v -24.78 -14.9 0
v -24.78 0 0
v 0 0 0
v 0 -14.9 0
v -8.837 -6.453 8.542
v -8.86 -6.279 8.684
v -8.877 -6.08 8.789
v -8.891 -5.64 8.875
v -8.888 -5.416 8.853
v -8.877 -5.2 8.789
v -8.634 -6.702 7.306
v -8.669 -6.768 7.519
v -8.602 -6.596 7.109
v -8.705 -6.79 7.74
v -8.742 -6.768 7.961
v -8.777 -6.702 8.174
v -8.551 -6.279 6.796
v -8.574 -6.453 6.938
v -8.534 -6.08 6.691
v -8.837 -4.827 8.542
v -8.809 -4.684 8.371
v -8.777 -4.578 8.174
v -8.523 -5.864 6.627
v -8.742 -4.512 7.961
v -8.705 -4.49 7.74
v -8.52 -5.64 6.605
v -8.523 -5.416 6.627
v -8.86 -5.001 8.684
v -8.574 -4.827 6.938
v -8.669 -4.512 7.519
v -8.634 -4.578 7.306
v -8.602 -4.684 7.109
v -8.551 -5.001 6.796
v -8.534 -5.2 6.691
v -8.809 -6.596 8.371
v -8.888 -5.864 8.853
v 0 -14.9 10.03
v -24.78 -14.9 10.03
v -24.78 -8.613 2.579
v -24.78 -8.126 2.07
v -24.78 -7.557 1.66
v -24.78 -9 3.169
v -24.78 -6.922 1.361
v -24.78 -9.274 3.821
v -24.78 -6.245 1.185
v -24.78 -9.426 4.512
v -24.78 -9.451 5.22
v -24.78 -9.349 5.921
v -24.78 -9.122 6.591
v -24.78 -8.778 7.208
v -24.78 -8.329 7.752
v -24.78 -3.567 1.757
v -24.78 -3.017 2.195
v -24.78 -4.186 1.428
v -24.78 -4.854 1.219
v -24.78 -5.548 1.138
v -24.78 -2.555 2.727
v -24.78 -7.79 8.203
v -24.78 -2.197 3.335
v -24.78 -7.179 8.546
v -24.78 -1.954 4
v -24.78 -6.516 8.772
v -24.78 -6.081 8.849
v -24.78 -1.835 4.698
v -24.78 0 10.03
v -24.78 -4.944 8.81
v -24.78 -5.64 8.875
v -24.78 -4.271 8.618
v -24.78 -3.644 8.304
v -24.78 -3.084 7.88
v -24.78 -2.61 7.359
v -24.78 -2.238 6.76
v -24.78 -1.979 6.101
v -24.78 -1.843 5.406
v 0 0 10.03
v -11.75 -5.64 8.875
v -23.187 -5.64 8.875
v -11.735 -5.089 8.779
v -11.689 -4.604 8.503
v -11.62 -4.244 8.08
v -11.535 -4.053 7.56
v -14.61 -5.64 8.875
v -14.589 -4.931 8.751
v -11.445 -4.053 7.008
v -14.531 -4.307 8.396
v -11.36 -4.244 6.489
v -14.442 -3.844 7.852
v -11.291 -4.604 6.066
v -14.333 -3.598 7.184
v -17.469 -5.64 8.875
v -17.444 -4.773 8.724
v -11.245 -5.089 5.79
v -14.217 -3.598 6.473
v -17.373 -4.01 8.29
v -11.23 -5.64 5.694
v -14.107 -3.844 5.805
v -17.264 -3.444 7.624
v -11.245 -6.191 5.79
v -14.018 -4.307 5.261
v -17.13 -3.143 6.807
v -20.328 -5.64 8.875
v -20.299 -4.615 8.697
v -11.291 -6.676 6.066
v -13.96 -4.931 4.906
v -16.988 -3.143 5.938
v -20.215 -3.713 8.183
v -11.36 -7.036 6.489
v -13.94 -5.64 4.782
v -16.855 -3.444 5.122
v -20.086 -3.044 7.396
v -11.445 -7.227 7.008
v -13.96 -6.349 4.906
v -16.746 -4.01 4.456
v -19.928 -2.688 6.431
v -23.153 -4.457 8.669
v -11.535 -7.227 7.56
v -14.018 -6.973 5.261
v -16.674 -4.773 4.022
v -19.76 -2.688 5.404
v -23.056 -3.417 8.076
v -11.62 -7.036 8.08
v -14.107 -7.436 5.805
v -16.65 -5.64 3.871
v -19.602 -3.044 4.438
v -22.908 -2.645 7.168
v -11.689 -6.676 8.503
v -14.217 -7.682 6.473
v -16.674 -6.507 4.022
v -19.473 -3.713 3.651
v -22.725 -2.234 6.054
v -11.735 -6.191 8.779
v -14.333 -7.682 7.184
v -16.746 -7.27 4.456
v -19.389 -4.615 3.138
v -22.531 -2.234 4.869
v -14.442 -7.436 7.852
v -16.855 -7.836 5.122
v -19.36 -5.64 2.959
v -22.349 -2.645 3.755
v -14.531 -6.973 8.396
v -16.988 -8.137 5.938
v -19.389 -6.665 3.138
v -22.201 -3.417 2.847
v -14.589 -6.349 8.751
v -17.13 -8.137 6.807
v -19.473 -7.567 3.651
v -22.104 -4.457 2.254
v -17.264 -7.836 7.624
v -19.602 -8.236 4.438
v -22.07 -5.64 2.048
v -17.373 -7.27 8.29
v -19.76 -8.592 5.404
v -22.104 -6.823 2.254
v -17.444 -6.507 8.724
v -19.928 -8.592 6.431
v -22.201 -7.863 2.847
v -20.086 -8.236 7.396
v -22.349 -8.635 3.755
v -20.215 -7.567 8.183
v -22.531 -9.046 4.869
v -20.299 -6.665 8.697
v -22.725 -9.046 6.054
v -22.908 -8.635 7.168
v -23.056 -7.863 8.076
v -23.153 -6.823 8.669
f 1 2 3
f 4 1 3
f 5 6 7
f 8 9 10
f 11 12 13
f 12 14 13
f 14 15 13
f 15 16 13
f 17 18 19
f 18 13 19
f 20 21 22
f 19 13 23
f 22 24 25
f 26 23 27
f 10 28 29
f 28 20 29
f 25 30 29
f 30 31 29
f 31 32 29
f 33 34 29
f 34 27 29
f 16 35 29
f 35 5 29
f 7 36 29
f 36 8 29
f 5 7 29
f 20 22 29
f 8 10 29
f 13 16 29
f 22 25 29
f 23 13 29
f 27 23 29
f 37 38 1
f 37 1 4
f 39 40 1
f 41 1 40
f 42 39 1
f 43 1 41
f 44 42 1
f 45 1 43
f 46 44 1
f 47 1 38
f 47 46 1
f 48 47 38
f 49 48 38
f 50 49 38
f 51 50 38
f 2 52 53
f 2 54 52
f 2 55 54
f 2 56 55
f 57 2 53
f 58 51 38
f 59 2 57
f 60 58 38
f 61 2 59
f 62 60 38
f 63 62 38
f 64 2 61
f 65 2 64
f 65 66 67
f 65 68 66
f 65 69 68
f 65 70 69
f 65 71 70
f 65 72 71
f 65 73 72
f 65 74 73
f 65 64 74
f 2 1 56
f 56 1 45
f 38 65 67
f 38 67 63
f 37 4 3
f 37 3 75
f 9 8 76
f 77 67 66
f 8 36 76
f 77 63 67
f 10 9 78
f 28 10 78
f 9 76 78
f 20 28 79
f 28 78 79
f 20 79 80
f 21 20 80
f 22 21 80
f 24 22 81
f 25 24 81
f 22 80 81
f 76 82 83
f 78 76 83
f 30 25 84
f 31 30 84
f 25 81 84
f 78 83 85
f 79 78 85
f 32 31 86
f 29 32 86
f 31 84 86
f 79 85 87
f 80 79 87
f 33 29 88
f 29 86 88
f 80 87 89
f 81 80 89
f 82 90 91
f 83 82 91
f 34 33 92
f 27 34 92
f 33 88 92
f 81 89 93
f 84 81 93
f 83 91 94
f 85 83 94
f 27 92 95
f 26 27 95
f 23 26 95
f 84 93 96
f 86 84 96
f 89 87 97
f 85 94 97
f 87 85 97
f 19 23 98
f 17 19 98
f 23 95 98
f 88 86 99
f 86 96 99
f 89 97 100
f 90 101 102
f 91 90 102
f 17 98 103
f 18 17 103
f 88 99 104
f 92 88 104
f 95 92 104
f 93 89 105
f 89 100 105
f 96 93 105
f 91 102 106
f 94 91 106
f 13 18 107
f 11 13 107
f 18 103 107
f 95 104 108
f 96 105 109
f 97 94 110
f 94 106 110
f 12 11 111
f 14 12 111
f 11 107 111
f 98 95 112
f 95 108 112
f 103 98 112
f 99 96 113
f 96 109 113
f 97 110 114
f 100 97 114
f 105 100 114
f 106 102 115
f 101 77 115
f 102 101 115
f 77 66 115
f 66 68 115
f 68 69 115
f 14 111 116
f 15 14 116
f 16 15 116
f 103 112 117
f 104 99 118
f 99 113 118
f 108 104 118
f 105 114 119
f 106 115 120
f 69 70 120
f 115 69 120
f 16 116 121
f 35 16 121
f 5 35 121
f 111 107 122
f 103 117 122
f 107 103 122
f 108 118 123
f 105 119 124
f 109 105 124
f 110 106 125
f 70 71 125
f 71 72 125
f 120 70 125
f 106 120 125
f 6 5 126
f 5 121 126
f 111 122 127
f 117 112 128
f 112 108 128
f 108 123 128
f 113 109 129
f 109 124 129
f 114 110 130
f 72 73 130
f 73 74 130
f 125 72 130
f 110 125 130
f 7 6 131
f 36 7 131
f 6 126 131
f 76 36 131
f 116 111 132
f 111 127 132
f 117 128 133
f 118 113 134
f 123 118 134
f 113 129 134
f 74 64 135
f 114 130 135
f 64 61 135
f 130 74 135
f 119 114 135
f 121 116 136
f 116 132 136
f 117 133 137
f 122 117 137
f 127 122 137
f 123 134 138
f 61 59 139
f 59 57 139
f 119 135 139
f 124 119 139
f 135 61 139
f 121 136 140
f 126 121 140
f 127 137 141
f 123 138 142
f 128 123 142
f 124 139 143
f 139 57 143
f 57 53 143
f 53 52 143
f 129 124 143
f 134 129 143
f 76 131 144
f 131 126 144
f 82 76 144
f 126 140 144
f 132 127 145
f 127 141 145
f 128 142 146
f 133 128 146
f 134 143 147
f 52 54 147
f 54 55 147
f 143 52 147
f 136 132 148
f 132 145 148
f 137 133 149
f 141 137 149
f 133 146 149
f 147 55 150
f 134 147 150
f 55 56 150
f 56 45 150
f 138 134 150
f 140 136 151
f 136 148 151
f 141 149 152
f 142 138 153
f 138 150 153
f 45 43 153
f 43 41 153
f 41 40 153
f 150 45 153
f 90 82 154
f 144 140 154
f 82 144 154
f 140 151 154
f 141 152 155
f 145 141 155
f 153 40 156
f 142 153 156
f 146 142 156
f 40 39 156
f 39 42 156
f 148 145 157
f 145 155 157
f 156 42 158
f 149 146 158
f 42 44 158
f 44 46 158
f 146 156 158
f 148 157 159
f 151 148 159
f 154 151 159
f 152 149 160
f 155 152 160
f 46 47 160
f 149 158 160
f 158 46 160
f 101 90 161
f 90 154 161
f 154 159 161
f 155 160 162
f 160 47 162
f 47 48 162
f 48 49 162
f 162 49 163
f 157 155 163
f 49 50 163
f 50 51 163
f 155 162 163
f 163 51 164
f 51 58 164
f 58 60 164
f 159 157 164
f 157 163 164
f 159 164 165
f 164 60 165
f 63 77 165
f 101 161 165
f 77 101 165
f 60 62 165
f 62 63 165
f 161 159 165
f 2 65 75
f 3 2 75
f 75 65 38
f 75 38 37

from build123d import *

# Parameters (mm, degrees)
F0_W     = 24.78
F0_H     = 10.03
F1_DEPTH = 14.9


with BuildPart() as f1:
    # F0 (on Front) → F1 (new body)
    with BuildSketch(Plane.XZ):
        with Locations((-12.39, 5.015)):
            Rectangle(F0_W, F0_H)
    extrude(amount=F1_DEPTH)

    # F3 (on offset) → F4 (revolve, cut)
    with BuildSketch(Plane.XZ.offset(5.64)):
        Polygon((-8.7054759357, 7.74), (-8.8912103195, 8.8749020833), (-26.6612103195, 8.8749020833), (-26.011947517, 4.9076791486), align=None)
    revolve(axis=Axis((-17.3587117264, -5.64, 6.3238395743), (-0.9868713768, 0, -0.1615081598)), mode=Mode.SUBTRACT)


solid = f1.part
